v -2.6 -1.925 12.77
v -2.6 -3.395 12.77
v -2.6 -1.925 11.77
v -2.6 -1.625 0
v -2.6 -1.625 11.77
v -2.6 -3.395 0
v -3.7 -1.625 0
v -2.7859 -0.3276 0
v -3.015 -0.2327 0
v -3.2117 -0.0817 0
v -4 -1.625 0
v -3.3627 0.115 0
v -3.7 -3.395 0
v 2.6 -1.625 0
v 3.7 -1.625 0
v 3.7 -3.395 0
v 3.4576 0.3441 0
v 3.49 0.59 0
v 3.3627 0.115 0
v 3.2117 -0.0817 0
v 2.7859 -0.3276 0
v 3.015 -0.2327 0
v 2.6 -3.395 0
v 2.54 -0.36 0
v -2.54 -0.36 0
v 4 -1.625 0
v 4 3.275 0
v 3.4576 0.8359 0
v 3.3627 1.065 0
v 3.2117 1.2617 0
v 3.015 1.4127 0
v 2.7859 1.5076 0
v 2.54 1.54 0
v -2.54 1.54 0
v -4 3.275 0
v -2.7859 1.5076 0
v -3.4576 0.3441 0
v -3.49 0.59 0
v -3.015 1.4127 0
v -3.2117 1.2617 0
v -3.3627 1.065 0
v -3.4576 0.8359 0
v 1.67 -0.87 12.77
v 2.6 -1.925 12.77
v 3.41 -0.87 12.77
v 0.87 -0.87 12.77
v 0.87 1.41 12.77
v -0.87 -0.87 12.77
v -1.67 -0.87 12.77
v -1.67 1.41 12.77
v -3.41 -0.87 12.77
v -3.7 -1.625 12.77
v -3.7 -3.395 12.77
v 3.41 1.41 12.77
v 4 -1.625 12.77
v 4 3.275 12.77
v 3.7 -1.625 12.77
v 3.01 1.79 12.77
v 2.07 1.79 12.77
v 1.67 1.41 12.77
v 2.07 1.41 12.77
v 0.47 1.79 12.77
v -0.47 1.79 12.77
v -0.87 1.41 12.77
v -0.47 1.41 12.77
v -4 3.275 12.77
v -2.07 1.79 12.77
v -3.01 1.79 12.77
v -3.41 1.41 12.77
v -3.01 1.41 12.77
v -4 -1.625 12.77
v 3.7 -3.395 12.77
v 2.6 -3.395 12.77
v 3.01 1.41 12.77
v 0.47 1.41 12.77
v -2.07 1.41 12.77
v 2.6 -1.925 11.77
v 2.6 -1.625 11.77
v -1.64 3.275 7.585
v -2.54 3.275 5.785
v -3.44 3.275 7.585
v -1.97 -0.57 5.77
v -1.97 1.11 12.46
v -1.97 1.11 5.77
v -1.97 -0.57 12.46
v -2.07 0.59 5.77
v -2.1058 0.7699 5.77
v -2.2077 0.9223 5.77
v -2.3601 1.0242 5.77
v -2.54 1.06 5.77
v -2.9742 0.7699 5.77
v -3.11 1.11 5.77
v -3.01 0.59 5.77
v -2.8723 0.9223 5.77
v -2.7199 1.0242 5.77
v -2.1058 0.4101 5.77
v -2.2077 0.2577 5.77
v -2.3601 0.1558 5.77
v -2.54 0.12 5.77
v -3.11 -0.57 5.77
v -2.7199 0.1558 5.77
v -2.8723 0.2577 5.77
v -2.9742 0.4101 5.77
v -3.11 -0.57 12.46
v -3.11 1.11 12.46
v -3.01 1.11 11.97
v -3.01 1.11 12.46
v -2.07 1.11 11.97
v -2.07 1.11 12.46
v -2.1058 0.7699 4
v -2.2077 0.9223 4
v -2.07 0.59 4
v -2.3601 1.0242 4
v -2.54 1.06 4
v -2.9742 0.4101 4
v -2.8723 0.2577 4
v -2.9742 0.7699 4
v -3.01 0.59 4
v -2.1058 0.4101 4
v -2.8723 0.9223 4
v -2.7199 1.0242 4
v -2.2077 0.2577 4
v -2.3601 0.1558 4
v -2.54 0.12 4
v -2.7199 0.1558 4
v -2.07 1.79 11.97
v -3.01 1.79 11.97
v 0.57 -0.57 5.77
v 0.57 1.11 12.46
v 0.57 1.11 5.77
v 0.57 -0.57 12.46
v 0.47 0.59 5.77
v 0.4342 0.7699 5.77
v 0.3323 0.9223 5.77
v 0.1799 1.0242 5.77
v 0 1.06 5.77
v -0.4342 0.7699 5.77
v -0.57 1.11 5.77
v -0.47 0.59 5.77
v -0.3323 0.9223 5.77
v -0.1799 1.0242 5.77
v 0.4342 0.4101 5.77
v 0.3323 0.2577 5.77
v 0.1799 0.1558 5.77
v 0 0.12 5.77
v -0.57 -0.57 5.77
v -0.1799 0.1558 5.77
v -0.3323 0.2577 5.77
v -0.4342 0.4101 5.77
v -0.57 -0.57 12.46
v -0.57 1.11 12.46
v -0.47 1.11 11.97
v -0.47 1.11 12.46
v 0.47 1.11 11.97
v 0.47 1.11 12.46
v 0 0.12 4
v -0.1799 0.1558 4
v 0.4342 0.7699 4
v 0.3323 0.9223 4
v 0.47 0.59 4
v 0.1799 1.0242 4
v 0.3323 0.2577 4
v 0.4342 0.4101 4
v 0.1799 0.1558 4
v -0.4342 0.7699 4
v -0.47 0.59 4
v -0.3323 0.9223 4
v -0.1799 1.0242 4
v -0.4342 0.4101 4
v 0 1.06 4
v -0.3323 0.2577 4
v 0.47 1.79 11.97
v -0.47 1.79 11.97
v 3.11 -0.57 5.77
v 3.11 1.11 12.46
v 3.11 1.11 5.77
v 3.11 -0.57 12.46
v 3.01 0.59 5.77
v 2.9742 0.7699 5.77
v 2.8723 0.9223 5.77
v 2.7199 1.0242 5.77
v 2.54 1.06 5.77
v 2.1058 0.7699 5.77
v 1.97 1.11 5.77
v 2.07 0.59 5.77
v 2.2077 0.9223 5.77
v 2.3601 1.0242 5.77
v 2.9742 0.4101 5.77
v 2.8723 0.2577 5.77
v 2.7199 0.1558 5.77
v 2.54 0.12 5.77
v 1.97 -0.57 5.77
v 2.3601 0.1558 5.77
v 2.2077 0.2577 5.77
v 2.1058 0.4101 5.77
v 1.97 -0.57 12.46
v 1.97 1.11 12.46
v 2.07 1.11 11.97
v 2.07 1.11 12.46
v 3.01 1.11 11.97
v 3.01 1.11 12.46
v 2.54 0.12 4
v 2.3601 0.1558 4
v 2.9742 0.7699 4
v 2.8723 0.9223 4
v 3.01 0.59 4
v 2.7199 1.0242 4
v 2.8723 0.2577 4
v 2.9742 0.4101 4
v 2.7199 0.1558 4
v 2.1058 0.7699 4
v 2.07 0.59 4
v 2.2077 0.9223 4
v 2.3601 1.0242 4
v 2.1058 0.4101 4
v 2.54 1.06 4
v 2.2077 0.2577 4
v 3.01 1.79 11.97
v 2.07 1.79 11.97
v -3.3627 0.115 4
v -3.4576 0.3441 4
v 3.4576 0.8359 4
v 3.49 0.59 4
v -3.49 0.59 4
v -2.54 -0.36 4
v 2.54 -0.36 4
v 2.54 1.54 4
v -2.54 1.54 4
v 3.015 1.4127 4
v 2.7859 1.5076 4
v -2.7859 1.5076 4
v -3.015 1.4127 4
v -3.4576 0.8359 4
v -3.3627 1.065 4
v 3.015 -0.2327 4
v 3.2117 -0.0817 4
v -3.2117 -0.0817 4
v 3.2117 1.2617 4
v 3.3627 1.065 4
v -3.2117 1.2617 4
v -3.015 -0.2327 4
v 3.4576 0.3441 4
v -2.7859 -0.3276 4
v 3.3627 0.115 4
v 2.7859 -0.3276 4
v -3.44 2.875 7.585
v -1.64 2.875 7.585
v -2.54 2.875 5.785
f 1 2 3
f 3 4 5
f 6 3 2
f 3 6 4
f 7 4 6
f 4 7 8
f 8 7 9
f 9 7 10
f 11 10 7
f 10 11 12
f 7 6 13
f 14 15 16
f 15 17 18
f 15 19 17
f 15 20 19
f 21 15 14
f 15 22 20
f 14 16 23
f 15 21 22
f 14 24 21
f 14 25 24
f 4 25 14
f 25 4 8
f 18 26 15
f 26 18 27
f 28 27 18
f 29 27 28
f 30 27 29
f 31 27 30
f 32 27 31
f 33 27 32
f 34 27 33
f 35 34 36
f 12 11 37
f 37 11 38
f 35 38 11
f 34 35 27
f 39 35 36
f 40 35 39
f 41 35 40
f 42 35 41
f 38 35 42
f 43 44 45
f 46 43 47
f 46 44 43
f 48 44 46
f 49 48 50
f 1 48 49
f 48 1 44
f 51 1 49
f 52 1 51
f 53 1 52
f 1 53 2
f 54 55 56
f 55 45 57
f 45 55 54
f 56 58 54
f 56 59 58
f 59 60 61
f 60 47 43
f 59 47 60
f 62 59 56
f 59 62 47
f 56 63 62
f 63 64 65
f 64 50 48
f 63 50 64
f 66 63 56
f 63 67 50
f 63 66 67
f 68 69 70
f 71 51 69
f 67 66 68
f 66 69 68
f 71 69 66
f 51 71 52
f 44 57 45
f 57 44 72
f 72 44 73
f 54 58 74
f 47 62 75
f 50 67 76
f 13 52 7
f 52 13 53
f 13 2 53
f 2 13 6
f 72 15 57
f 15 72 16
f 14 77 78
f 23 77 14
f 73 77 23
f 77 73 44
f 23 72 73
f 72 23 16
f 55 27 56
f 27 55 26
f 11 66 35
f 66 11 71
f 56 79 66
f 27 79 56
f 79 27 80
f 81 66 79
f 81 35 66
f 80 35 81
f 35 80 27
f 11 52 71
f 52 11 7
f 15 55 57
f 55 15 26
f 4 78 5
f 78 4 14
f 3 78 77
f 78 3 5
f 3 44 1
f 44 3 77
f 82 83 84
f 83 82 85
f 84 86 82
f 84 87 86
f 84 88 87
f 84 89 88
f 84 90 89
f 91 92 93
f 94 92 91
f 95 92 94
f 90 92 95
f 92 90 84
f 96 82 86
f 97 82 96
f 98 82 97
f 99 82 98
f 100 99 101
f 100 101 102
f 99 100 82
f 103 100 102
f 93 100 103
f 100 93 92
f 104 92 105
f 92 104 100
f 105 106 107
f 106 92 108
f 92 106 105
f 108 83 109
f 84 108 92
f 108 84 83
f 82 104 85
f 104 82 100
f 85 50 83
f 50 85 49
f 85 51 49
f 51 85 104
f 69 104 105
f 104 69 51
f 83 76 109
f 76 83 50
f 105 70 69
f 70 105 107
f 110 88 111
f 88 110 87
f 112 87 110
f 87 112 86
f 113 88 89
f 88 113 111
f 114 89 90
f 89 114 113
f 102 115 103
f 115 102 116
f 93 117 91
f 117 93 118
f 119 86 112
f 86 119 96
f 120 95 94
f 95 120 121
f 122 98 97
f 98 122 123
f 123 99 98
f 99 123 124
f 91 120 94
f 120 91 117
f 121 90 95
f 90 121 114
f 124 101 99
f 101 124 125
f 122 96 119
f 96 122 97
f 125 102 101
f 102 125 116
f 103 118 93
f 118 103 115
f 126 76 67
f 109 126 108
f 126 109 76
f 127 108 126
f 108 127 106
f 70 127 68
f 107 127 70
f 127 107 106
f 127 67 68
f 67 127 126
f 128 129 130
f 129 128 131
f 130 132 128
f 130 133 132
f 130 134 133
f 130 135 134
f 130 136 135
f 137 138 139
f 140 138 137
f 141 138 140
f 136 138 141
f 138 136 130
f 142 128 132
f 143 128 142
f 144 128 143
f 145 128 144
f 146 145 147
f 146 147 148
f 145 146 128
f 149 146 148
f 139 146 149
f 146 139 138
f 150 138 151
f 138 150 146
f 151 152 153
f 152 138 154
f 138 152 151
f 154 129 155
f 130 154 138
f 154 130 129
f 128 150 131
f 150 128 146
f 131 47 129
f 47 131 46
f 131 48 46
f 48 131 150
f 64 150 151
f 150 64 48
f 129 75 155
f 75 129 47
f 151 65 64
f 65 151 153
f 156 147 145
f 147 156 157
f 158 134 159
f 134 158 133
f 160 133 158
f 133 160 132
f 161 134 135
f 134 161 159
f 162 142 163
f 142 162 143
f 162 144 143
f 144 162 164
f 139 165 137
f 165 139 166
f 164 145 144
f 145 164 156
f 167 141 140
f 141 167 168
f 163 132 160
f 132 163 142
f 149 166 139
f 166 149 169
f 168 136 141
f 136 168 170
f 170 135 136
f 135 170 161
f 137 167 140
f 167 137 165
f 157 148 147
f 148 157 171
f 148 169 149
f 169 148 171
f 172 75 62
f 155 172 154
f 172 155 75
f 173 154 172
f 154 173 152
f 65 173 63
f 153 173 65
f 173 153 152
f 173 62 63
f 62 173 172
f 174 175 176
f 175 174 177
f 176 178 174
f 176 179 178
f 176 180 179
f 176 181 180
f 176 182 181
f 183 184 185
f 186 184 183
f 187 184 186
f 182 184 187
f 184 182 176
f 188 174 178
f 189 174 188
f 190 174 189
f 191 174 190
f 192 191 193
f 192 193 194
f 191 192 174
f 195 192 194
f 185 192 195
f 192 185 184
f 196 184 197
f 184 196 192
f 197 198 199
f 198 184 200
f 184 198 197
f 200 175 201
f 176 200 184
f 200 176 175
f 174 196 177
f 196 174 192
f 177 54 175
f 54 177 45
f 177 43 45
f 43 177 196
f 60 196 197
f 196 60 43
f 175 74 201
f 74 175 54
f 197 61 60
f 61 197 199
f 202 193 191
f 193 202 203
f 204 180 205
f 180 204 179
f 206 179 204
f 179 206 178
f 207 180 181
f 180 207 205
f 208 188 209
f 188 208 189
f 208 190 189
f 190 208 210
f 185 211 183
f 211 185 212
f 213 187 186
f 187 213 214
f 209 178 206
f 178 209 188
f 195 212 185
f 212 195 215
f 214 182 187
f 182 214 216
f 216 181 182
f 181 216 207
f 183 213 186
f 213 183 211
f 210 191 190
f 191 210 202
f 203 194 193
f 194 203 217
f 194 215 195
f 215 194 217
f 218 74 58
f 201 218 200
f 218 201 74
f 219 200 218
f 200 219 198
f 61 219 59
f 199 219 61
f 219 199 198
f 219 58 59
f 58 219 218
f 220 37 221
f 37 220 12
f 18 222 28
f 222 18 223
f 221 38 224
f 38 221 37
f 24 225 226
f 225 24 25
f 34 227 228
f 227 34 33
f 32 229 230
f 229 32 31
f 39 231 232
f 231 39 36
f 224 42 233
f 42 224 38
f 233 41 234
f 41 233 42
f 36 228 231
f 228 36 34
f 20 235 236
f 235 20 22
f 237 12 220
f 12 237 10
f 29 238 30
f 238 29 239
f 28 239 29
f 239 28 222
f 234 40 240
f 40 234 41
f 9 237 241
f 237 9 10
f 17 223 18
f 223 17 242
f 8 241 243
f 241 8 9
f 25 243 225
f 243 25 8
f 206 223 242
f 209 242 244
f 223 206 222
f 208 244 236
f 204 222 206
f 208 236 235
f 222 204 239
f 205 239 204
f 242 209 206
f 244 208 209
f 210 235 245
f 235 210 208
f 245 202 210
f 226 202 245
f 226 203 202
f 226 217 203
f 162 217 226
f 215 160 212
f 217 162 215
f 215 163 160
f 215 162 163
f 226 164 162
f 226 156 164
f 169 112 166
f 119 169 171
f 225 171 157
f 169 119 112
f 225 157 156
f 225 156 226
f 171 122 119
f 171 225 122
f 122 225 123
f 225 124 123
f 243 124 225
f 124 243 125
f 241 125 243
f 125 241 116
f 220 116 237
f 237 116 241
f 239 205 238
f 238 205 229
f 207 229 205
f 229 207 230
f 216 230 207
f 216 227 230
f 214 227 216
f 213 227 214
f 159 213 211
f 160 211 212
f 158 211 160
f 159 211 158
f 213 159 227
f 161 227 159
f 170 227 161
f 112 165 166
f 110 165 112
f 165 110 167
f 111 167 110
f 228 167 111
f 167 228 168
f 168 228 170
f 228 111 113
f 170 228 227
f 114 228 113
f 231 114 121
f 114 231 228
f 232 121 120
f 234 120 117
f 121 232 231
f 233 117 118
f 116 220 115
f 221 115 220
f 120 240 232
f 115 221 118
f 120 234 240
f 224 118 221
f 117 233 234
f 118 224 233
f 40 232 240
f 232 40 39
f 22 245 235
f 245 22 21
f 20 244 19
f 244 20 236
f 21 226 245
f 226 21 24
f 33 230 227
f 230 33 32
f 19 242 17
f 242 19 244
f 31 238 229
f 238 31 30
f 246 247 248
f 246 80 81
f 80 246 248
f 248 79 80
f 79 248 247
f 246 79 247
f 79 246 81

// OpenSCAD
// SPDX-FileCopyrightText: 2026 Alon A. Rabinowitz
// SPDX-License-Identifier: CC-BY-4.0

// The female, 3 pins, as it prints. Everything is in fan-connector.scad; this file only picks the part.
include <fan-connector.scad>
part = "female";
pins = 3;
